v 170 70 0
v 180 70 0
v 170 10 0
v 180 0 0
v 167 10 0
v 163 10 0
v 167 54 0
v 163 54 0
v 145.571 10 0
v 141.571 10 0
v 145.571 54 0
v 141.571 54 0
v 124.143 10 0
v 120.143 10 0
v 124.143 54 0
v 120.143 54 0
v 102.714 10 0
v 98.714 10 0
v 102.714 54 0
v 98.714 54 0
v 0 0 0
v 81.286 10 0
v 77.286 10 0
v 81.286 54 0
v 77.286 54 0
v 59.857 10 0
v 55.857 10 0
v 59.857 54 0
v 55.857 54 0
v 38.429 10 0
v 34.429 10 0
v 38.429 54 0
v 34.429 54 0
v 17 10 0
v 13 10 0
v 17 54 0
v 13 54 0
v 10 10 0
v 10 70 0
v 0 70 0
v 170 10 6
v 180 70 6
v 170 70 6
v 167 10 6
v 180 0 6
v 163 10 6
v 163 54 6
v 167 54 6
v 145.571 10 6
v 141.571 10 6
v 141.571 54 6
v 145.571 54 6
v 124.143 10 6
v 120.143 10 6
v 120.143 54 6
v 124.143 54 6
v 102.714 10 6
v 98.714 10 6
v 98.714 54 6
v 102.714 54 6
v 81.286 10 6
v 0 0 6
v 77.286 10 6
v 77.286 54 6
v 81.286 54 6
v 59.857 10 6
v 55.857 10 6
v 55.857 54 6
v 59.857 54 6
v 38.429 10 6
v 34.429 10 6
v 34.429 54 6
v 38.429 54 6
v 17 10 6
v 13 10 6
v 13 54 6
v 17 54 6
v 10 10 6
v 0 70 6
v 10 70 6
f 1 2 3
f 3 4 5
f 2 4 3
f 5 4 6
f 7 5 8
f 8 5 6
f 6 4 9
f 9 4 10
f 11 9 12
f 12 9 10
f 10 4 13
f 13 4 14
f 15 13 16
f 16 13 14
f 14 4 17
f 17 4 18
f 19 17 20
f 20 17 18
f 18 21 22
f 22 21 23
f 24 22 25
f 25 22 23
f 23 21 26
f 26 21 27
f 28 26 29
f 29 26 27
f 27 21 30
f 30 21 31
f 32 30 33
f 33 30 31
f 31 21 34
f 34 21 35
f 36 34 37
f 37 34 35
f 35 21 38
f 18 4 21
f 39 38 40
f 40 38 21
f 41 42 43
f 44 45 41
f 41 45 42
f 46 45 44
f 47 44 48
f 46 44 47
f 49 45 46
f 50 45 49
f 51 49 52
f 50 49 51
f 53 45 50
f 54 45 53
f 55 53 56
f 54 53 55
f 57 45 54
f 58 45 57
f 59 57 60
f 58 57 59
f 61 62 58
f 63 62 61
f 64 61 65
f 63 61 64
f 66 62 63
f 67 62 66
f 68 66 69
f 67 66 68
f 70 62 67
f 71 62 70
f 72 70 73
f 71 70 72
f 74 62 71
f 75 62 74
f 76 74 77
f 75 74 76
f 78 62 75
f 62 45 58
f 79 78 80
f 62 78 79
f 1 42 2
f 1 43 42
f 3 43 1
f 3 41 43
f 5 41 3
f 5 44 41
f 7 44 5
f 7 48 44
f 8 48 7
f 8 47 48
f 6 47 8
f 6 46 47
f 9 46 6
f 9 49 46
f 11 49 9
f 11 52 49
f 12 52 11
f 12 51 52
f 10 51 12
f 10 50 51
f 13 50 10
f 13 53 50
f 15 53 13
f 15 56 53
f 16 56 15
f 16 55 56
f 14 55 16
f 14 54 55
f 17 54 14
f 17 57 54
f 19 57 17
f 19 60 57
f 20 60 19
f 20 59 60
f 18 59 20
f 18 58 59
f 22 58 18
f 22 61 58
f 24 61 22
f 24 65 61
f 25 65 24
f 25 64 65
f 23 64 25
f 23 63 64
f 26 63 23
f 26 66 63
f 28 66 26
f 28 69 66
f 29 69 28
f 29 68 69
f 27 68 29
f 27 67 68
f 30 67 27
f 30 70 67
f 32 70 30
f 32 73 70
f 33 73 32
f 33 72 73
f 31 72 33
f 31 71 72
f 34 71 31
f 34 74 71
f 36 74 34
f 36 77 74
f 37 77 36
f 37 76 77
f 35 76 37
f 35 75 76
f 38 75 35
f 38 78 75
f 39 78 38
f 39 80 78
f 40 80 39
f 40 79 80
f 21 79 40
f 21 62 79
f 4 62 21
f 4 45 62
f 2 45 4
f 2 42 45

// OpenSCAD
$fn = 32;

// ----------------------------------------------------------------------
// Guard grille: 8 slats over a 180 x 70 mm plate
// ----------------------------------------------------------------------

// --- parameters (mm) ---
profile_height = 6;       // extrusion height
profile_points = 40;      // points of the closed outline

profile = [[0, 0], [180, 0], [180, 70], [170, 70], [170, 10], [167, 10], [167, 54], [163, 54], [163, 10], [145.571, 10], [145.571, 54], [141.571, 54], [141.571, 10], [124.143, 10], [124.143, 54], [120.143, 54], [120.143, 10], [102.714, 10], [102.714, 54], [98.714, 54], [98.714, 10], [81.286, 10], [81.286, 54], [77.286, 54], [77.286, 10], [59.857, 10], [59.857, 54], [55.857, 54], [55.857, 10], [38.429, 10], [38.429, 54], [34.429, 54], [34.429, 10], [17, 10], [17, 54], [13, 54], [13, 10], [10, 10], [10, 70], [0, 70]];  // single closed polygon, 40 points, counter clockwise

// --- the one profile operation ---
linear_extrude(height = profile_height) polygon(points = profile);
